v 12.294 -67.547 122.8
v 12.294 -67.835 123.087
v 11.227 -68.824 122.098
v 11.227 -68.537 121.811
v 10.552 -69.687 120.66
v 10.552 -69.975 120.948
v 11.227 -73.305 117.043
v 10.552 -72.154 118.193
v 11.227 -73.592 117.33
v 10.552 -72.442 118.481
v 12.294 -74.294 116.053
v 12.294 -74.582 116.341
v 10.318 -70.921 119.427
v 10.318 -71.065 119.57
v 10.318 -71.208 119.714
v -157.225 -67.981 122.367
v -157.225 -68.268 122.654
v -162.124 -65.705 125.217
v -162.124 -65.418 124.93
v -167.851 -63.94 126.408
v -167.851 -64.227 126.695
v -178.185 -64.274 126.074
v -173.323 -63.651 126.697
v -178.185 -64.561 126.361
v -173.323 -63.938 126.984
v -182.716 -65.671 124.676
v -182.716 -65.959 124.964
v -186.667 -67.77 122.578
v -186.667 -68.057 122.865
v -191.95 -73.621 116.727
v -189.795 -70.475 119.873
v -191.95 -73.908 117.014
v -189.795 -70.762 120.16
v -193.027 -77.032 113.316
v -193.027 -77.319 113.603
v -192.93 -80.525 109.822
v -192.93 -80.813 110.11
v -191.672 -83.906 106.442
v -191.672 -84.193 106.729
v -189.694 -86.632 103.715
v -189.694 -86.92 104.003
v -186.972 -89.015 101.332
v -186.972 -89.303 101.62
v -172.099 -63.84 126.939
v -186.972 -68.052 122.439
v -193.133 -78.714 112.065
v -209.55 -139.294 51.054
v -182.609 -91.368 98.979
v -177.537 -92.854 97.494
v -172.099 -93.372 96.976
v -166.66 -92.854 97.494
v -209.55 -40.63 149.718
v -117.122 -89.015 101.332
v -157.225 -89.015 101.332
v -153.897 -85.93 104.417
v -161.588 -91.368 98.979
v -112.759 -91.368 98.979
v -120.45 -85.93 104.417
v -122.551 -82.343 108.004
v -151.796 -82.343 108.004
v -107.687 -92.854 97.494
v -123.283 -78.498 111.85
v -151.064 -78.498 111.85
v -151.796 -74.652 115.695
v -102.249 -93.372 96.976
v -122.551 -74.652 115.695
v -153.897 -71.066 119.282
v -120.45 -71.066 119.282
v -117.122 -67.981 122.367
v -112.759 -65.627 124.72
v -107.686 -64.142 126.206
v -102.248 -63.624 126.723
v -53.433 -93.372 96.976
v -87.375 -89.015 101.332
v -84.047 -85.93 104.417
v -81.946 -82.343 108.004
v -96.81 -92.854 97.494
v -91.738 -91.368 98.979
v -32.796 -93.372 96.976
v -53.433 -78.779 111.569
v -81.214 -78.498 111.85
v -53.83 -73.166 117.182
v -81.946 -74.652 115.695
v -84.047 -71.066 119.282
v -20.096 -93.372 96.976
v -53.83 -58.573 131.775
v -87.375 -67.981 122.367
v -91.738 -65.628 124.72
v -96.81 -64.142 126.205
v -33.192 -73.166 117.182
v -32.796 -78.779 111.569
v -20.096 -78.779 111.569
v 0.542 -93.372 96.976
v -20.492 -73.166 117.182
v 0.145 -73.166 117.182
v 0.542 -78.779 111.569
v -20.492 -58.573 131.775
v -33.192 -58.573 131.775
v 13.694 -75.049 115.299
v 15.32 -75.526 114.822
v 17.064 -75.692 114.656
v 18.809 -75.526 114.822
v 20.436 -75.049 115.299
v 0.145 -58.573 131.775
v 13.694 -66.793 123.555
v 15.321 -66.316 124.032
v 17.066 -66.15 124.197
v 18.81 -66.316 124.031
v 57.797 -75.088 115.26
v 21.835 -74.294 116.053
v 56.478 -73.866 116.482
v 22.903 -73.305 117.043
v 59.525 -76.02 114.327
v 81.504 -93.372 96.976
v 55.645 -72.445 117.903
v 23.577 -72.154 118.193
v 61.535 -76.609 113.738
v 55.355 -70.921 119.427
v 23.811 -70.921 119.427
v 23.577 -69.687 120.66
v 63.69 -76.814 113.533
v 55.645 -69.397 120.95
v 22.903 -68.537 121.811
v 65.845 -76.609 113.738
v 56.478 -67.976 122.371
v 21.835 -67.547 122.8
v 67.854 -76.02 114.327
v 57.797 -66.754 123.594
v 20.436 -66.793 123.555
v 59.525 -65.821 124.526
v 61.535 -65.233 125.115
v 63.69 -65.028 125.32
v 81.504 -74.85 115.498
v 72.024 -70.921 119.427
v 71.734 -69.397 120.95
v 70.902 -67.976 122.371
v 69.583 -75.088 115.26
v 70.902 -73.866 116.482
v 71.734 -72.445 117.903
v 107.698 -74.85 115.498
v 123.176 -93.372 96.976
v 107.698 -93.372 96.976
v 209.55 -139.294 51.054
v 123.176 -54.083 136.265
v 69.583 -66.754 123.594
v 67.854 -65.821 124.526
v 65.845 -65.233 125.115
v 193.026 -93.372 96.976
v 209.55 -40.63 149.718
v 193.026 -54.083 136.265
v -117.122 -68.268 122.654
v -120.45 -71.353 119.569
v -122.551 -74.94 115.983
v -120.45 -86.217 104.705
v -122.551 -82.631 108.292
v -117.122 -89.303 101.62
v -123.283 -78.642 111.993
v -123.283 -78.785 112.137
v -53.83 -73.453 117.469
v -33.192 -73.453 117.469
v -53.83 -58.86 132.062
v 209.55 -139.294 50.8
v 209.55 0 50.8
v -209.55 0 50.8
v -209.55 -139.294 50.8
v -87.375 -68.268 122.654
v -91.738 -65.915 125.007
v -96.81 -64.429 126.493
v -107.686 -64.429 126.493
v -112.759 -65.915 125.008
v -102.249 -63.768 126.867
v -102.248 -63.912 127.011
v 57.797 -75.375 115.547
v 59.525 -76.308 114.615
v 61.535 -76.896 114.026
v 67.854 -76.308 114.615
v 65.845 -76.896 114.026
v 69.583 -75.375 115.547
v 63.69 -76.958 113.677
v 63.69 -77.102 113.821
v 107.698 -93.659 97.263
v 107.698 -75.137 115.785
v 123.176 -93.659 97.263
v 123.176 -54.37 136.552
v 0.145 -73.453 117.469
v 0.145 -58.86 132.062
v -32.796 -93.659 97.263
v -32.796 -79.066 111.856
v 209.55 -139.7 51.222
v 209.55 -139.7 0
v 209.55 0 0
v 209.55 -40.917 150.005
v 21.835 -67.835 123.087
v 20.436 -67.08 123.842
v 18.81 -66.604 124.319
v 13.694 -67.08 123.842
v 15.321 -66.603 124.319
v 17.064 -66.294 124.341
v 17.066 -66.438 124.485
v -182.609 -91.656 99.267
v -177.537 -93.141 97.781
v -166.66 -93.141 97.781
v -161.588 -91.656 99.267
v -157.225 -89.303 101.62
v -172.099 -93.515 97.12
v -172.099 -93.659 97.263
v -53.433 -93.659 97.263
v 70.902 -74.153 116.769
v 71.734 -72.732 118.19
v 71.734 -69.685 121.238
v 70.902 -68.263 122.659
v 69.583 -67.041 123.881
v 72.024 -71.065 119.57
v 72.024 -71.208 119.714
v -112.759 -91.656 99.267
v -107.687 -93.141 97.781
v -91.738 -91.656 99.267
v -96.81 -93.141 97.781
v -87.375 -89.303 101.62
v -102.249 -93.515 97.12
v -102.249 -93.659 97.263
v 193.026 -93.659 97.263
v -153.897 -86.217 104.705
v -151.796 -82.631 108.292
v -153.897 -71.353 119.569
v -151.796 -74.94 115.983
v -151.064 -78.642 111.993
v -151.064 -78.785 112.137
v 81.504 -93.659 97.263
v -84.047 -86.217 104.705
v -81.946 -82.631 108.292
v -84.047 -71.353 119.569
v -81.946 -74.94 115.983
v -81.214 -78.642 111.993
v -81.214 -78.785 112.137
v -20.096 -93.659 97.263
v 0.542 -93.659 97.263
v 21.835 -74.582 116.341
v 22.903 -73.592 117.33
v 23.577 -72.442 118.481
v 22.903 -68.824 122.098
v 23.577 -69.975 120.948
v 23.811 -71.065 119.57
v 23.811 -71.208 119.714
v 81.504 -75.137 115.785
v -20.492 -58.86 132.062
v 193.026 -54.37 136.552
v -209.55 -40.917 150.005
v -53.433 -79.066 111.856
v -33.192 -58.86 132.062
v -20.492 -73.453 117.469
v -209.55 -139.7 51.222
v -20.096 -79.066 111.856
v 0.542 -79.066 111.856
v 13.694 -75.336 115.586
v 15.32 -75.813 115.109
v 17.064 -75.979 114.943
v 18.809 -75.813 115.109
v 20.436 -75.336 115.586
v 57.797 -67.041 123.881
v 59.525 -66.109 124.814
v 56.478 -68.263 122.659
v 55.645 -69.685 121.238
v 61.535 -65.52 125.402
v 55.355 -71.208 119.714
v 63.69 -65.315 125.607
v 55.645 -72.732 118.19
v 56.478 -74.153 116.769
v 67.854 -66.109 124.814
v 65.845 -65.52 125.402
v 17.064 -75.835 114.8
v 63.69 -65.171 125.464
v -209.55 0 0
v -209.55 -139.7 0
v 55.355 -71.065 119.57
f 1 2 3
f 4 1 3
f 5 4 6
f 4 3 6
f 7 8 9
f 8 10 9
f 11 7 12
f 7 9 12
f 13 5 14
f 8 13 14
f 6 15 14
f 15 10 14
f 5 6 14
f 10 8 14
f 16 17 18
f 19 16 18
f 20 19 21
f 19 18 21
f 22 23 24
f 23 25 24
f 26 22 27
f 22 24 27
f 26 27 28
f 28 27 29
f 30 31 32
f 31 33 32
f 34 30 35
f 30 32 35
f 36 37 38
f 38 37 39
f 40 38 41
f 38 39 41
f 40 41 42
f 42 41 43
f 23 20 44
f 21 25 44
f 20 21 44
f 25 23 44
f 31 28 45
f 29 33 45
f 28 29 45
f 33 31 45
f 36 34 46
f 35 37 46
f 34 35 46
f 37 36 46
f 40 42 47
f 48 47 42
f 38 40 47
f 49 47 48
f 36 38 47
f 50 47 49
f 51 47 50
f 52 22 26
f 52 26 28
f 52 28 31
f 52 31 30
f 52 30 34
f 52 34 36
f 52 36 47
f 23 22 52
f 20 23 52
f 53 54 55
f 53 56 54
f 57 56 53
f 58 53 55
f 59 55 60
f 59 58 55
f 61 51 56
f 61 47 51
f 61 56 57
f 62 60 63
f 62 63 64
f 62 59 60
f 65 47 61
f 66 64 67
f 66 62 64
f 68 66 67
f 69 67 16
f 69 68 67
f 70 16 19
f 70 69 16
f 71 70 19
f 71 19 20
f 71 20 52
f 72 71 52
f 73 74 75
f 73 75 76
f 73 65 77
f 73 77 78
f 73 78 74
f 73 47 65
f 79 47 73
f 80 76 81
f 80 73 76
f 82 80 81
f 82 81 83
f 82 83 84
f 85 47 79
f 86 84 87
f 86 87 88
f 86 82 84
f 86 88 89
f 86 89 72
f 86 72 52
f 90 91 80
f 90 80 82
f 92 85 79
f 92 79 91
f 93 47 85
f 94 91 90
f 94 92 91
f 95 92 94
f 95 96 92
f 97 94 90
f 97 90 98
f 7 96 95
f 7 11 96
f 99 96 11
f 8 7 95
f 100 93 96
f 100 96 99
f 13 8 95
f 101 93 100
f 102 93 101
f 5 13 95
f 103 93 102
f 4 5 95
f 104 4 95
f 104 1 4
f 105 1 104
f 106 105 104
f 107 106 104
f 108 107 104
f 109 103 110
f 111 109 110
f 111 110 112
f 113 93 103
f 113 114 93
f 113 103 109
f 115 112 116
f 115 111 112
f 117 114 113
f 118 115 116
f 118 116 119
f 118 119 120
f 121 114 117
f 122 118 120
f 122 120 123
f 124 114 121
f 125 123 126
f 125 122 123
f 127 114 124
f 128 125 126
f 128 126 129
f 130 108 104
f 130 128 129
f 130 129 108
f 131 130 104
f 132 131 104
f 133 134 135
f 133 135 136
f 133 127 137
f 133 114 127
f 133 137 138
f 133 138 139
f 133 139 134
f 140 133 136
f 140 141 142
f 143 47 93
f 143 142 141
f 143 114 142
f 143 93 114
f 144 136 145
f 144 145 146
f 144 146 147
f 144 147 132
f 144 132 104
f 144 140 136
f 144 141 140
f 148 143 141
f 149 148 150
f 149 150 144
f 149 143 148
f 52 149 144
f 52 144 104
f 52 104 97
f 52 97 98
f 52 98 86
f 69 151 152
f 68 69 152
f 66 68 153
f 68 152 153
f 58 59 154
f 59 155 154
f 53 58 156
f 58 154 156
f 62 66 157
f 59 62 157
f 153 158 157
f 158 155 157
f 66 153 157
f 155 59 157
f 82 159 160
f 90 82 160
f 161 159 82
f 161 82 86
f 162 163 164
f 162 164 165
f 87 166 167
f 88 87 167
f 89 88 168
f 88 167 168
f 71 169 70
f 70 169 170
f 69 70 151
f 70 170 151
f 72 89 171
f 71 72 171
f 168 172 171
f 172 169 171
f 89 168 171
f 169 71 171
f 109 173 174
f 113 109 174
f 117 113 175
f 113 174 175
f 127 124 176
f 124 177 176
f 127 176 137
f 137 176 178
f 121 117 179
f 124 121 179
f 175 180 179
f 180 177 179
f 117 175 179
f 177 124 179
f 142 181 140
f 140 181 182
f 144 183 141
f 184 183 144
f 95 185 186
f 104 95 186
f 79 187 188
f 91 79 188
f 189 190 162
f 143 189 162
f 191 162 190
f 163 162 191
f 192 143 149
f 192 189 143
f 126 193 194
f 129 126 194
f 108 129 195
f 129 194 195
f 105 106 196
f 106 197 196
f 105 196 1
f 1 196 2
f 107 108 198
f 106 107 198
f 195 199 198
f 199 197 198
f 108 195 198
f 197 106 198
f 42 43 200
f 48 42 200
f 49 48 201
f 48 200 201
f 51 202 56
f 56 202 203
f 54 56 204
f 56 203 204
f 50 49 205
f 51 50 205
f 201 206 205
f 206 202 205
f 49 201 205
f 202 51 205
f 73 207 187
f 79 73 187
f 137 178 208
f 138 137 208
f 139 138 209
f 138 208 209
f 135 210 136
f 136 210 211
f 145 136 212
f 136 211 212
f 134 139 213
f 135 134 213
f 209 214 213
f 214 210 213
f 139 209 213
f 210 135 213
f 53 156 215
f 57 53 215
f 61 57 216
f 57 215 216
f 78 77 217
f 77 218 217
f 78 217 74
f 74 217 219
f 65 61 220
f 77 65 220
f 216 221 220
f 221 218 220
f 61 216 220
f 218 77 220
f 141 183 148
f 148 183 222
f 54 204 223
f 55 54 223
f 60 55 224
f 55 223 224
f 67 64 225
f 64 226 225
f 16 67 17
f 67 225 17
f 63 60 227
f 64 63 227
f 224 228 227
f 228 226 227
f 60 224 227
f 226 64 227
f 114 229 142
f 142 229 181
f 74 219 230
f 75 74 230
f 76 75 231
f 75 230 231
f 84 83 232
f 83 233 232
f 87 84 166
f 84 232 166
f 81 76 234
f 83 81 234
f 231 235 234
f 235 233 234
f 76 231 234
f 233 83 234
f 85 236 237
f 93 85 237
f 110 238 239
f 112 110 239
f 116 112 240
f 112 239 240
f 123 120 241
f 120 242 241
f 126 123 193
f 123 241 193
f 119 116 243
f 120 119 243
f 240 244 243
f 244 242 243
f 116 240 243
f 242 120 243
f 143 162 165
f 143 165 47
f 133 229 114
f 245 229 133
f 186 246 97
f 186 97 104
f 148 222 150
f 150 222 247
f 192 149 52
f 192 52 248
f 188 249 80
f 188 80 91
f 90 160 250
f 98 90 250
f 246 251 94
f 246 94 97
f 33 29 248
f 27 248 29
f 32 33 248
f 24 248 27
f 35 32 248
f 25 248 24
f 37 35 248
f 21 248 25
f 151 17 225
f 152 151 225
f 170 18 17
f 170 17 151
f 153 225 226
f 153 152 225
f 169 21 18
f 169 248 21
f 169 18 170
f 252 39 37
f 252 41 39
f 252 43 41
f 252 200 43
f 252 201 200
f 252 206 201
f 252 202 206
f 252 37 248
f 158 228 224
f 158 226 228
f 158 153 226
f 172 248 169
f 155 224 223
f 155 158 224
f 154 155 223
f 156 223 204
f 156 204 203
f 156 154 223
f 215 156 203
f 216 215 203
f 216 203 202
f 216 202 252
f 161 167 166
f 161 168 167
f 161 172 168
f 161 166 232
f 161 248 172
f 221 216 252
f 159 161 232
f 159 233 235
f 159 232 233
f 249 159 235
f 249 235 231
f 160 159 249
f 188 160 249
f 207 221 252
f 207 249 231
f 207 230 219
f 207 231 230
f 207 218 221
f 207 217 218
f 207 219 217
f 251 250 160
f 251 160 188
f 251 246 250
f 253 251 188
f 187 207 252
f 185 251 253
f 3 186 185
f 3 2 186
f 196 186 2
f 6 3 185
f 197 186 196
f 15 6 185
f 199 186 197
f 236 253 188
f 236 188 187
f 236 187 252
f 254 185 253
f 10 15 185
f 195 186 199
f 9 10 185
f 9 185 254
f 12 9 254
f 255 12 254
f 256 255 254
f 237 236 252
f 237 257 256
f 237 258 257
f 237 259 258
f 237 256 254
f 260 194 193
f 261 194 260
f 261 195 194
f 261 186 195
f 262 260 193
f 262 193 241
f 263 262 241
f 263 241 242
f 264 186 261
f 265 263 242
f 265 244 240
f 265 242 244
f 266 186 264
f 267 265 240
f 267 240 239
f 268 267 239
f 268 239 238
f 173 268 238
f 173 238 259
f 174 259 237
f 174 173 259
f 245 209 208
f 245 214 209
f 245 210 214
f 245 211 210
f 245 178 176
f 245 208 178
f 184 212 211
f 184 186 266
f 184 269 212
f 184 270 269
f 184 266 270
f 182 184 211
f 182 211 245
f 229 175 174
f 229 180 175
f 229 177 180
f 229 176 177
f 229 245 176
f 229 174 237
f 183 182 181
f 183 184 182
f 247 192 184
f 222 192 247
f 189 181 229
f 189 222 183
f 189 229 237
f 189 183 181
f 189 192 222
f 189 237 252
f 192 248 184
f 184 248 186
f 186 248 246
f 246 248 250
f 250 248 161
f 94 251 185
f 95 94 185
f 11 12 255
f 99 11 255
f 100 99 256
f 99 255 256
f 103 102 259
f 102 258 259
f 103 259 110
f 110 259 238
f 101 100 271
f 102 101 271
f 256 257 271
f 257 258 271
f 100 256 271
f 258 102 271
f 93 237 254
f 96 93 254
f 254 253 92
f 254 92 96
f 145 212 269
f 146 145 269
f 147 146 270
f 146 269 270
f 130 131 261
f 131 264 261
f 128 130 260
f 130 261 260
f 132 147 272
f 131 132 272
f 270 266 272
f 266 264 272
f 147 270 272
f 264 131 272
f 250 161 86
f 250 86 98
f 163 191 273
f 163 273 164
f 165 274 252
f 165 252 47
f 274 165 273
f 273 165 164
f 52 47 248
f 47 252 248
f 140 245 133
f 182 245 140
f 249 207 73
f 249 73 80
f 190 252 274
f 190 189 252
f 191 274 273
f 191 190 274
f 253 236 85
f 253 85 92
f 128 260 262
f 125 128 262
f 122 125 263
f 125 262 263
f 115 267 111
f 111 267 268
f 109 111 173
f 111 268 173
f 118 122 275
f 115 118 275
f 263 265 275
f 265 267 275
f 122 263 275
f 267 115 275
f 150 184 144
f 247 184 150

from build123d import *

# Parameters (mm, degrees)
F1_DEPTH = 209.55
F2_W     = 20.6375
F2_H     = 20.6375
F2_W_2   = 20.6374746
F2_W_3   = 69.85
F2_H_2   = 55.5625
F2_W_4   = 26.19375
F2_H_3   = 26.19375
F3_DEPTH = 0.4064


# Not quite as in the source:
# - the dataset's text gives a spline's control points without its knots; the knots are read off the source's solid


with BuildPart() as f1:
    # F0 (on Right) → F1 (new body, symmetric)
    with BuildSketch(Plane.YZ):
        Polygon((-139.7, 0), (0, 0), (0, 50.8), (-139.2936, 50.8), (-139.2936, 51.054), (-40.6298144724, 149.7177855276), (-40.9171826682, 150.0051537235), (-139.7, 51.2223363917), align=None)
    extrude(amount=F1_DEPTH, both=True)

    # F2 (on face) → F3 (cut, through all)
    with BuildSketch(Plane(origin=(0, -95.4611681959, 95.4611681959), x_dir=(1, 0, 0), z_dir=(0, -0.7071067812, 0.7071067812))):
        with Locations((-43.1144662619, 12.8675024964)):
            Rectangle(F2_W, F2_H)
        with Locations((-43.5109856619, 41.4425024964)):
            Rectangle(F2_W, F2_H)
        with Locations((-9.7769662619, 12.8675024964)):
            Rectangle(F2_W, F2_H)
        with Locations((-10.1734983619, 41.4425024964)):
            Rectangle(F2_W_2, F2_H)
        with Locations((158.1011587381, 30.3300024964)):
            Rectangle(F2_W_3, F2_H_2)
        with Locations((94.6011587381, 15.6456274964)):
            Rectangle(F2_W_4, F2_H_3)
        with BuildLine():
            add(Edge.make_bspline(
                [(21.8352387381, 39.0695074964), (20.5863715381, 40.3187048964), (18.8311045381, 41.0456274964), (17.0644329381, 41.0456274964)],
                knots=[7, 7, 7, 7, 8, 8, 8, 8], degree=3))
            add(Edge.make_bspline(
                [(17.0644329381, 41.0456274964), (15.2984979381, 41.0456274964), (13.5432309381, 40.3187048964), (12.2940335381, 39.0695074964)],
                knots=[0, 0, 0, 0, 1, 1, 1, 1], degree=3))
            add(Edge.make_bspline(
                [(12.2940335381, 39.0695074964), (11.0451663381, 37.8209958964), (10.3175579381, 36.0653986964), (10.3175579381, 34.2987524964), (10.3175579381, 32.5327920964), (11.0451663381, 30.7771440964), (12.2940335381, 29.5279720964)],
                knots=[1, 1, 1, 1, 2, 2, 2, 3, 3, 3, 3], degree=3))
            add(Edge.make_bspline(
                [(12.2940335381, 29.5279720964), (13.5432309381, 28.2794858964), (15.2984979381, 27.5518774964), (17.0644329381, 27.5518774964), (18.8311045381, 27.5518774964), (20.5863715381, 28.2794858964), (21.8352387381, 29.5279720964)],
                knots=[3, 3, 3, 3, 4, 4, 4, 5, 5, 5, 5], degree=3))
            add(Edge.make_bspline(
                [(21.8352387381, 29.5279720964), (23.0844107381, 30.7771440964), (23.8113079381, 32.5327920964), (23.8113079381, 34.2987524964), (23.8113079381, 36.0653986964), (23.0844107381, 37.8209958964), (21.8352387381, 39.0695074964)],
                knots=[5, 5, 5, 5, 6, 6, 6, 7, 7, 7, 7], degree=3))
        make_face()
        with BuildLine():
            add(Edge.make_bspline(
                [(-87.3753632619, 38.4569864964), (-91.2690054619, 42.3506286964), (-96.7418418619, 44.6175024964), (-102.2488412619, 44.6175024964)],
                knots=[7, 7, 7, 7, 8, 8, 8, 8], degree=3))
            add(Edge.make_bspline(
                [(-102.2488412619, 44.6175024964), (-107.7551548619, 44.6175024964), (-113.2283468619, 42.3506286964), (-117.1219890619, 38.4569864964)],
                knots=[0, 0, 0, 0, 1, 1, 1, 1], degree=3))
            add(Edge.make_bspline(
                [(-117.1219890619, 38.4569864964), (-121.0156820619, 34.5633442964), (-123.2832162619, 29.0904570964), (-123.2832162619, 23.5831274964), (-123.2832162619, 18.0764836964), (-121.0156820619, 12.6035964964), (-117.1219890619, 8.7092430964)],
                knots=[1, 1, 1, 1, 2, 2, 2, 3, 3, 3, 3], degree=3))
            add(Edge.make_bspline(
                [(-117.1219890619, 8.7092430964), (-113.2283468619, 4.8156008964), (-107.7551548619, 2.5487524964), (-102.2488412619, 2.5487524964), (-96.7418418619, 2.5487524964), (-91.2690054619, 4.8156008964), (-87.3753632619, 8.7092430964)],
                knots=[3, 3, 3, 3, 4, 4, 4, 5, 5, 5, 5], degree=3))
            add(Edge.make_bspline(
                [(-87.3753632619, 8.7092430964), (-83.4813654619, 12.6035964964), (-81.2144662619, 18.0764836964), (-81.2144662619, 23.5831274964), (-81.2144662619, 29.0904570964), (-83.4813654619, 34.5633442964), (-87.3753632619, 38.4569864964)],
                knots=[5, 5, 5, 5, 6, 6, 6, 7, 7, 7, 7], degree=3))
        make_face()
        with BuildLine():
            add(Edge.make_bspline(
                [(-157.2253632619, 38.4569864964), (-161.1190054619, 42.3506286964), (-166.5918418619, 44.6175024964), (-172.0988412619, 44.6175024964)],
                knots=[7, 7, 7, 7, 8, 8, 8, 8], degree=3))
            add(Edge.make_bspline(
                [(-172.0988412619, 44.6175024964), (-177.6051548619, 44.6175024964), (-183.0781690619, 42.3506286964), (-186.9721668619, 38.4569864964), (-190.8661646619, 34.5633442964), (-193.1332162619, 29.0904570964), (-193.1332162619, 23.5831274964), (-193.1332162619, 18.0764836964), (-190.8661646619, 12.6035964964), (-186.9721668619, 8.7092430964)],
                knots=[0, 0, 0, 0, 1, 1, 1, 2, 2, 2, 3, 3, 3, 3], degree=3))
            add(Edge.make_bspline(
                [(-186.9721668619, 8.7092430964), (-183.0781690619, 4.8156008964), (-177.6051548619, 2.5487524964), (-172.0988412619, 2.5487524964), (-166.5918418619, 2.5487524964), (-161.1190054619, 4.8156008964), (-157.2253632619, 8.7092430964)],
                knots=[3, 3, 3, 3, 4, 4, 4, 5, 5, 5, 5], degree=3))
            add(Edge.make_bspline(
                [(-157.2253632619, 8.7092430964), (-153.3313654619, 12.6035964964), (-151.0644662619, 18.0764836964), (-151.0644662619, 23.5831274964), (-151.0644662619, 29.0904570964), (-153.3313654619, 34.5633442964), (-157.2253632619, 38.4569864964)],
                knots=[5, 5, 5, 5, 6, 6, 6, 7, 7, 7, 7], degree=3))
        make_face()
        with BuildLine():
            add(Edge.make_bspline(
                [(69.5828445381, 40.1919080964), (68.0401501381, 41.7353136964), (65.8721585381, 42.6331274964), (63.6896889381, 42.6331274964)],
                knots=[7, 7, 7, 7, 8, 8, 8, 8], degree=3))
            add(Edge.make_bspline(
                [(63.6896889381, 42.6331274964), (61.5075495381, 42.6331274964), (59.3392023381, 41.7353136964), (57.7965079381, 40.1919080964)],
                knots=[0, 0, 0, 0, 1, 1, 1, 1], degree=3))
            add(Edge.make_bspline(
                [(57.7965079381, 40.1919080964), (56.2534579381, 38.6492136964), (55.3553139381, 36.4808664964), (55.3553139381, 34.2987524964), (55.3553139381, 32.1166130964), (56.2534579381, 29.9482658964), (57.7965079381, 28.4055714964)],
                knots=[1, 1, 1, 1, 2, 2, 2, 3, 3, 3, 3], degree=3))
            add(Edge.make_bspline(
                [(57.7965079381, 28.4055714964), (59.3392023381, 26.8628262964), (61.5075495381, 25.9643774964), (63.6896889381, 25.9643774964), (65.8721585381, 25.9643774964), (68.0401501381, 26.8628262964), (69.5828445381, 28.4055714964)],
                knots=[3, 3, 3, 3, 4, 4, 4, 5, 5, 5, 5], degree=3))
            add(Edge.make_bspline(
                [(69.5828445381, 28.4055714964), (71.1259453381, 29.9482658964), (72.0240639381, 32.1166130964), (72.0240639381, 34.2987524964), (72.0240639381, 36.4808664964), (71.1259453381, 38.6492136964), (69.5828445381, 40.1919080964)],
                knots=[5, 5, 5, 5, 6, 6, 6, 7, 7, 7, 7], degree=3))
        make_face()
    extrude(amount=-F3_DEPTH, mode=Mode.SUBTRACT)


solid = f1.part
